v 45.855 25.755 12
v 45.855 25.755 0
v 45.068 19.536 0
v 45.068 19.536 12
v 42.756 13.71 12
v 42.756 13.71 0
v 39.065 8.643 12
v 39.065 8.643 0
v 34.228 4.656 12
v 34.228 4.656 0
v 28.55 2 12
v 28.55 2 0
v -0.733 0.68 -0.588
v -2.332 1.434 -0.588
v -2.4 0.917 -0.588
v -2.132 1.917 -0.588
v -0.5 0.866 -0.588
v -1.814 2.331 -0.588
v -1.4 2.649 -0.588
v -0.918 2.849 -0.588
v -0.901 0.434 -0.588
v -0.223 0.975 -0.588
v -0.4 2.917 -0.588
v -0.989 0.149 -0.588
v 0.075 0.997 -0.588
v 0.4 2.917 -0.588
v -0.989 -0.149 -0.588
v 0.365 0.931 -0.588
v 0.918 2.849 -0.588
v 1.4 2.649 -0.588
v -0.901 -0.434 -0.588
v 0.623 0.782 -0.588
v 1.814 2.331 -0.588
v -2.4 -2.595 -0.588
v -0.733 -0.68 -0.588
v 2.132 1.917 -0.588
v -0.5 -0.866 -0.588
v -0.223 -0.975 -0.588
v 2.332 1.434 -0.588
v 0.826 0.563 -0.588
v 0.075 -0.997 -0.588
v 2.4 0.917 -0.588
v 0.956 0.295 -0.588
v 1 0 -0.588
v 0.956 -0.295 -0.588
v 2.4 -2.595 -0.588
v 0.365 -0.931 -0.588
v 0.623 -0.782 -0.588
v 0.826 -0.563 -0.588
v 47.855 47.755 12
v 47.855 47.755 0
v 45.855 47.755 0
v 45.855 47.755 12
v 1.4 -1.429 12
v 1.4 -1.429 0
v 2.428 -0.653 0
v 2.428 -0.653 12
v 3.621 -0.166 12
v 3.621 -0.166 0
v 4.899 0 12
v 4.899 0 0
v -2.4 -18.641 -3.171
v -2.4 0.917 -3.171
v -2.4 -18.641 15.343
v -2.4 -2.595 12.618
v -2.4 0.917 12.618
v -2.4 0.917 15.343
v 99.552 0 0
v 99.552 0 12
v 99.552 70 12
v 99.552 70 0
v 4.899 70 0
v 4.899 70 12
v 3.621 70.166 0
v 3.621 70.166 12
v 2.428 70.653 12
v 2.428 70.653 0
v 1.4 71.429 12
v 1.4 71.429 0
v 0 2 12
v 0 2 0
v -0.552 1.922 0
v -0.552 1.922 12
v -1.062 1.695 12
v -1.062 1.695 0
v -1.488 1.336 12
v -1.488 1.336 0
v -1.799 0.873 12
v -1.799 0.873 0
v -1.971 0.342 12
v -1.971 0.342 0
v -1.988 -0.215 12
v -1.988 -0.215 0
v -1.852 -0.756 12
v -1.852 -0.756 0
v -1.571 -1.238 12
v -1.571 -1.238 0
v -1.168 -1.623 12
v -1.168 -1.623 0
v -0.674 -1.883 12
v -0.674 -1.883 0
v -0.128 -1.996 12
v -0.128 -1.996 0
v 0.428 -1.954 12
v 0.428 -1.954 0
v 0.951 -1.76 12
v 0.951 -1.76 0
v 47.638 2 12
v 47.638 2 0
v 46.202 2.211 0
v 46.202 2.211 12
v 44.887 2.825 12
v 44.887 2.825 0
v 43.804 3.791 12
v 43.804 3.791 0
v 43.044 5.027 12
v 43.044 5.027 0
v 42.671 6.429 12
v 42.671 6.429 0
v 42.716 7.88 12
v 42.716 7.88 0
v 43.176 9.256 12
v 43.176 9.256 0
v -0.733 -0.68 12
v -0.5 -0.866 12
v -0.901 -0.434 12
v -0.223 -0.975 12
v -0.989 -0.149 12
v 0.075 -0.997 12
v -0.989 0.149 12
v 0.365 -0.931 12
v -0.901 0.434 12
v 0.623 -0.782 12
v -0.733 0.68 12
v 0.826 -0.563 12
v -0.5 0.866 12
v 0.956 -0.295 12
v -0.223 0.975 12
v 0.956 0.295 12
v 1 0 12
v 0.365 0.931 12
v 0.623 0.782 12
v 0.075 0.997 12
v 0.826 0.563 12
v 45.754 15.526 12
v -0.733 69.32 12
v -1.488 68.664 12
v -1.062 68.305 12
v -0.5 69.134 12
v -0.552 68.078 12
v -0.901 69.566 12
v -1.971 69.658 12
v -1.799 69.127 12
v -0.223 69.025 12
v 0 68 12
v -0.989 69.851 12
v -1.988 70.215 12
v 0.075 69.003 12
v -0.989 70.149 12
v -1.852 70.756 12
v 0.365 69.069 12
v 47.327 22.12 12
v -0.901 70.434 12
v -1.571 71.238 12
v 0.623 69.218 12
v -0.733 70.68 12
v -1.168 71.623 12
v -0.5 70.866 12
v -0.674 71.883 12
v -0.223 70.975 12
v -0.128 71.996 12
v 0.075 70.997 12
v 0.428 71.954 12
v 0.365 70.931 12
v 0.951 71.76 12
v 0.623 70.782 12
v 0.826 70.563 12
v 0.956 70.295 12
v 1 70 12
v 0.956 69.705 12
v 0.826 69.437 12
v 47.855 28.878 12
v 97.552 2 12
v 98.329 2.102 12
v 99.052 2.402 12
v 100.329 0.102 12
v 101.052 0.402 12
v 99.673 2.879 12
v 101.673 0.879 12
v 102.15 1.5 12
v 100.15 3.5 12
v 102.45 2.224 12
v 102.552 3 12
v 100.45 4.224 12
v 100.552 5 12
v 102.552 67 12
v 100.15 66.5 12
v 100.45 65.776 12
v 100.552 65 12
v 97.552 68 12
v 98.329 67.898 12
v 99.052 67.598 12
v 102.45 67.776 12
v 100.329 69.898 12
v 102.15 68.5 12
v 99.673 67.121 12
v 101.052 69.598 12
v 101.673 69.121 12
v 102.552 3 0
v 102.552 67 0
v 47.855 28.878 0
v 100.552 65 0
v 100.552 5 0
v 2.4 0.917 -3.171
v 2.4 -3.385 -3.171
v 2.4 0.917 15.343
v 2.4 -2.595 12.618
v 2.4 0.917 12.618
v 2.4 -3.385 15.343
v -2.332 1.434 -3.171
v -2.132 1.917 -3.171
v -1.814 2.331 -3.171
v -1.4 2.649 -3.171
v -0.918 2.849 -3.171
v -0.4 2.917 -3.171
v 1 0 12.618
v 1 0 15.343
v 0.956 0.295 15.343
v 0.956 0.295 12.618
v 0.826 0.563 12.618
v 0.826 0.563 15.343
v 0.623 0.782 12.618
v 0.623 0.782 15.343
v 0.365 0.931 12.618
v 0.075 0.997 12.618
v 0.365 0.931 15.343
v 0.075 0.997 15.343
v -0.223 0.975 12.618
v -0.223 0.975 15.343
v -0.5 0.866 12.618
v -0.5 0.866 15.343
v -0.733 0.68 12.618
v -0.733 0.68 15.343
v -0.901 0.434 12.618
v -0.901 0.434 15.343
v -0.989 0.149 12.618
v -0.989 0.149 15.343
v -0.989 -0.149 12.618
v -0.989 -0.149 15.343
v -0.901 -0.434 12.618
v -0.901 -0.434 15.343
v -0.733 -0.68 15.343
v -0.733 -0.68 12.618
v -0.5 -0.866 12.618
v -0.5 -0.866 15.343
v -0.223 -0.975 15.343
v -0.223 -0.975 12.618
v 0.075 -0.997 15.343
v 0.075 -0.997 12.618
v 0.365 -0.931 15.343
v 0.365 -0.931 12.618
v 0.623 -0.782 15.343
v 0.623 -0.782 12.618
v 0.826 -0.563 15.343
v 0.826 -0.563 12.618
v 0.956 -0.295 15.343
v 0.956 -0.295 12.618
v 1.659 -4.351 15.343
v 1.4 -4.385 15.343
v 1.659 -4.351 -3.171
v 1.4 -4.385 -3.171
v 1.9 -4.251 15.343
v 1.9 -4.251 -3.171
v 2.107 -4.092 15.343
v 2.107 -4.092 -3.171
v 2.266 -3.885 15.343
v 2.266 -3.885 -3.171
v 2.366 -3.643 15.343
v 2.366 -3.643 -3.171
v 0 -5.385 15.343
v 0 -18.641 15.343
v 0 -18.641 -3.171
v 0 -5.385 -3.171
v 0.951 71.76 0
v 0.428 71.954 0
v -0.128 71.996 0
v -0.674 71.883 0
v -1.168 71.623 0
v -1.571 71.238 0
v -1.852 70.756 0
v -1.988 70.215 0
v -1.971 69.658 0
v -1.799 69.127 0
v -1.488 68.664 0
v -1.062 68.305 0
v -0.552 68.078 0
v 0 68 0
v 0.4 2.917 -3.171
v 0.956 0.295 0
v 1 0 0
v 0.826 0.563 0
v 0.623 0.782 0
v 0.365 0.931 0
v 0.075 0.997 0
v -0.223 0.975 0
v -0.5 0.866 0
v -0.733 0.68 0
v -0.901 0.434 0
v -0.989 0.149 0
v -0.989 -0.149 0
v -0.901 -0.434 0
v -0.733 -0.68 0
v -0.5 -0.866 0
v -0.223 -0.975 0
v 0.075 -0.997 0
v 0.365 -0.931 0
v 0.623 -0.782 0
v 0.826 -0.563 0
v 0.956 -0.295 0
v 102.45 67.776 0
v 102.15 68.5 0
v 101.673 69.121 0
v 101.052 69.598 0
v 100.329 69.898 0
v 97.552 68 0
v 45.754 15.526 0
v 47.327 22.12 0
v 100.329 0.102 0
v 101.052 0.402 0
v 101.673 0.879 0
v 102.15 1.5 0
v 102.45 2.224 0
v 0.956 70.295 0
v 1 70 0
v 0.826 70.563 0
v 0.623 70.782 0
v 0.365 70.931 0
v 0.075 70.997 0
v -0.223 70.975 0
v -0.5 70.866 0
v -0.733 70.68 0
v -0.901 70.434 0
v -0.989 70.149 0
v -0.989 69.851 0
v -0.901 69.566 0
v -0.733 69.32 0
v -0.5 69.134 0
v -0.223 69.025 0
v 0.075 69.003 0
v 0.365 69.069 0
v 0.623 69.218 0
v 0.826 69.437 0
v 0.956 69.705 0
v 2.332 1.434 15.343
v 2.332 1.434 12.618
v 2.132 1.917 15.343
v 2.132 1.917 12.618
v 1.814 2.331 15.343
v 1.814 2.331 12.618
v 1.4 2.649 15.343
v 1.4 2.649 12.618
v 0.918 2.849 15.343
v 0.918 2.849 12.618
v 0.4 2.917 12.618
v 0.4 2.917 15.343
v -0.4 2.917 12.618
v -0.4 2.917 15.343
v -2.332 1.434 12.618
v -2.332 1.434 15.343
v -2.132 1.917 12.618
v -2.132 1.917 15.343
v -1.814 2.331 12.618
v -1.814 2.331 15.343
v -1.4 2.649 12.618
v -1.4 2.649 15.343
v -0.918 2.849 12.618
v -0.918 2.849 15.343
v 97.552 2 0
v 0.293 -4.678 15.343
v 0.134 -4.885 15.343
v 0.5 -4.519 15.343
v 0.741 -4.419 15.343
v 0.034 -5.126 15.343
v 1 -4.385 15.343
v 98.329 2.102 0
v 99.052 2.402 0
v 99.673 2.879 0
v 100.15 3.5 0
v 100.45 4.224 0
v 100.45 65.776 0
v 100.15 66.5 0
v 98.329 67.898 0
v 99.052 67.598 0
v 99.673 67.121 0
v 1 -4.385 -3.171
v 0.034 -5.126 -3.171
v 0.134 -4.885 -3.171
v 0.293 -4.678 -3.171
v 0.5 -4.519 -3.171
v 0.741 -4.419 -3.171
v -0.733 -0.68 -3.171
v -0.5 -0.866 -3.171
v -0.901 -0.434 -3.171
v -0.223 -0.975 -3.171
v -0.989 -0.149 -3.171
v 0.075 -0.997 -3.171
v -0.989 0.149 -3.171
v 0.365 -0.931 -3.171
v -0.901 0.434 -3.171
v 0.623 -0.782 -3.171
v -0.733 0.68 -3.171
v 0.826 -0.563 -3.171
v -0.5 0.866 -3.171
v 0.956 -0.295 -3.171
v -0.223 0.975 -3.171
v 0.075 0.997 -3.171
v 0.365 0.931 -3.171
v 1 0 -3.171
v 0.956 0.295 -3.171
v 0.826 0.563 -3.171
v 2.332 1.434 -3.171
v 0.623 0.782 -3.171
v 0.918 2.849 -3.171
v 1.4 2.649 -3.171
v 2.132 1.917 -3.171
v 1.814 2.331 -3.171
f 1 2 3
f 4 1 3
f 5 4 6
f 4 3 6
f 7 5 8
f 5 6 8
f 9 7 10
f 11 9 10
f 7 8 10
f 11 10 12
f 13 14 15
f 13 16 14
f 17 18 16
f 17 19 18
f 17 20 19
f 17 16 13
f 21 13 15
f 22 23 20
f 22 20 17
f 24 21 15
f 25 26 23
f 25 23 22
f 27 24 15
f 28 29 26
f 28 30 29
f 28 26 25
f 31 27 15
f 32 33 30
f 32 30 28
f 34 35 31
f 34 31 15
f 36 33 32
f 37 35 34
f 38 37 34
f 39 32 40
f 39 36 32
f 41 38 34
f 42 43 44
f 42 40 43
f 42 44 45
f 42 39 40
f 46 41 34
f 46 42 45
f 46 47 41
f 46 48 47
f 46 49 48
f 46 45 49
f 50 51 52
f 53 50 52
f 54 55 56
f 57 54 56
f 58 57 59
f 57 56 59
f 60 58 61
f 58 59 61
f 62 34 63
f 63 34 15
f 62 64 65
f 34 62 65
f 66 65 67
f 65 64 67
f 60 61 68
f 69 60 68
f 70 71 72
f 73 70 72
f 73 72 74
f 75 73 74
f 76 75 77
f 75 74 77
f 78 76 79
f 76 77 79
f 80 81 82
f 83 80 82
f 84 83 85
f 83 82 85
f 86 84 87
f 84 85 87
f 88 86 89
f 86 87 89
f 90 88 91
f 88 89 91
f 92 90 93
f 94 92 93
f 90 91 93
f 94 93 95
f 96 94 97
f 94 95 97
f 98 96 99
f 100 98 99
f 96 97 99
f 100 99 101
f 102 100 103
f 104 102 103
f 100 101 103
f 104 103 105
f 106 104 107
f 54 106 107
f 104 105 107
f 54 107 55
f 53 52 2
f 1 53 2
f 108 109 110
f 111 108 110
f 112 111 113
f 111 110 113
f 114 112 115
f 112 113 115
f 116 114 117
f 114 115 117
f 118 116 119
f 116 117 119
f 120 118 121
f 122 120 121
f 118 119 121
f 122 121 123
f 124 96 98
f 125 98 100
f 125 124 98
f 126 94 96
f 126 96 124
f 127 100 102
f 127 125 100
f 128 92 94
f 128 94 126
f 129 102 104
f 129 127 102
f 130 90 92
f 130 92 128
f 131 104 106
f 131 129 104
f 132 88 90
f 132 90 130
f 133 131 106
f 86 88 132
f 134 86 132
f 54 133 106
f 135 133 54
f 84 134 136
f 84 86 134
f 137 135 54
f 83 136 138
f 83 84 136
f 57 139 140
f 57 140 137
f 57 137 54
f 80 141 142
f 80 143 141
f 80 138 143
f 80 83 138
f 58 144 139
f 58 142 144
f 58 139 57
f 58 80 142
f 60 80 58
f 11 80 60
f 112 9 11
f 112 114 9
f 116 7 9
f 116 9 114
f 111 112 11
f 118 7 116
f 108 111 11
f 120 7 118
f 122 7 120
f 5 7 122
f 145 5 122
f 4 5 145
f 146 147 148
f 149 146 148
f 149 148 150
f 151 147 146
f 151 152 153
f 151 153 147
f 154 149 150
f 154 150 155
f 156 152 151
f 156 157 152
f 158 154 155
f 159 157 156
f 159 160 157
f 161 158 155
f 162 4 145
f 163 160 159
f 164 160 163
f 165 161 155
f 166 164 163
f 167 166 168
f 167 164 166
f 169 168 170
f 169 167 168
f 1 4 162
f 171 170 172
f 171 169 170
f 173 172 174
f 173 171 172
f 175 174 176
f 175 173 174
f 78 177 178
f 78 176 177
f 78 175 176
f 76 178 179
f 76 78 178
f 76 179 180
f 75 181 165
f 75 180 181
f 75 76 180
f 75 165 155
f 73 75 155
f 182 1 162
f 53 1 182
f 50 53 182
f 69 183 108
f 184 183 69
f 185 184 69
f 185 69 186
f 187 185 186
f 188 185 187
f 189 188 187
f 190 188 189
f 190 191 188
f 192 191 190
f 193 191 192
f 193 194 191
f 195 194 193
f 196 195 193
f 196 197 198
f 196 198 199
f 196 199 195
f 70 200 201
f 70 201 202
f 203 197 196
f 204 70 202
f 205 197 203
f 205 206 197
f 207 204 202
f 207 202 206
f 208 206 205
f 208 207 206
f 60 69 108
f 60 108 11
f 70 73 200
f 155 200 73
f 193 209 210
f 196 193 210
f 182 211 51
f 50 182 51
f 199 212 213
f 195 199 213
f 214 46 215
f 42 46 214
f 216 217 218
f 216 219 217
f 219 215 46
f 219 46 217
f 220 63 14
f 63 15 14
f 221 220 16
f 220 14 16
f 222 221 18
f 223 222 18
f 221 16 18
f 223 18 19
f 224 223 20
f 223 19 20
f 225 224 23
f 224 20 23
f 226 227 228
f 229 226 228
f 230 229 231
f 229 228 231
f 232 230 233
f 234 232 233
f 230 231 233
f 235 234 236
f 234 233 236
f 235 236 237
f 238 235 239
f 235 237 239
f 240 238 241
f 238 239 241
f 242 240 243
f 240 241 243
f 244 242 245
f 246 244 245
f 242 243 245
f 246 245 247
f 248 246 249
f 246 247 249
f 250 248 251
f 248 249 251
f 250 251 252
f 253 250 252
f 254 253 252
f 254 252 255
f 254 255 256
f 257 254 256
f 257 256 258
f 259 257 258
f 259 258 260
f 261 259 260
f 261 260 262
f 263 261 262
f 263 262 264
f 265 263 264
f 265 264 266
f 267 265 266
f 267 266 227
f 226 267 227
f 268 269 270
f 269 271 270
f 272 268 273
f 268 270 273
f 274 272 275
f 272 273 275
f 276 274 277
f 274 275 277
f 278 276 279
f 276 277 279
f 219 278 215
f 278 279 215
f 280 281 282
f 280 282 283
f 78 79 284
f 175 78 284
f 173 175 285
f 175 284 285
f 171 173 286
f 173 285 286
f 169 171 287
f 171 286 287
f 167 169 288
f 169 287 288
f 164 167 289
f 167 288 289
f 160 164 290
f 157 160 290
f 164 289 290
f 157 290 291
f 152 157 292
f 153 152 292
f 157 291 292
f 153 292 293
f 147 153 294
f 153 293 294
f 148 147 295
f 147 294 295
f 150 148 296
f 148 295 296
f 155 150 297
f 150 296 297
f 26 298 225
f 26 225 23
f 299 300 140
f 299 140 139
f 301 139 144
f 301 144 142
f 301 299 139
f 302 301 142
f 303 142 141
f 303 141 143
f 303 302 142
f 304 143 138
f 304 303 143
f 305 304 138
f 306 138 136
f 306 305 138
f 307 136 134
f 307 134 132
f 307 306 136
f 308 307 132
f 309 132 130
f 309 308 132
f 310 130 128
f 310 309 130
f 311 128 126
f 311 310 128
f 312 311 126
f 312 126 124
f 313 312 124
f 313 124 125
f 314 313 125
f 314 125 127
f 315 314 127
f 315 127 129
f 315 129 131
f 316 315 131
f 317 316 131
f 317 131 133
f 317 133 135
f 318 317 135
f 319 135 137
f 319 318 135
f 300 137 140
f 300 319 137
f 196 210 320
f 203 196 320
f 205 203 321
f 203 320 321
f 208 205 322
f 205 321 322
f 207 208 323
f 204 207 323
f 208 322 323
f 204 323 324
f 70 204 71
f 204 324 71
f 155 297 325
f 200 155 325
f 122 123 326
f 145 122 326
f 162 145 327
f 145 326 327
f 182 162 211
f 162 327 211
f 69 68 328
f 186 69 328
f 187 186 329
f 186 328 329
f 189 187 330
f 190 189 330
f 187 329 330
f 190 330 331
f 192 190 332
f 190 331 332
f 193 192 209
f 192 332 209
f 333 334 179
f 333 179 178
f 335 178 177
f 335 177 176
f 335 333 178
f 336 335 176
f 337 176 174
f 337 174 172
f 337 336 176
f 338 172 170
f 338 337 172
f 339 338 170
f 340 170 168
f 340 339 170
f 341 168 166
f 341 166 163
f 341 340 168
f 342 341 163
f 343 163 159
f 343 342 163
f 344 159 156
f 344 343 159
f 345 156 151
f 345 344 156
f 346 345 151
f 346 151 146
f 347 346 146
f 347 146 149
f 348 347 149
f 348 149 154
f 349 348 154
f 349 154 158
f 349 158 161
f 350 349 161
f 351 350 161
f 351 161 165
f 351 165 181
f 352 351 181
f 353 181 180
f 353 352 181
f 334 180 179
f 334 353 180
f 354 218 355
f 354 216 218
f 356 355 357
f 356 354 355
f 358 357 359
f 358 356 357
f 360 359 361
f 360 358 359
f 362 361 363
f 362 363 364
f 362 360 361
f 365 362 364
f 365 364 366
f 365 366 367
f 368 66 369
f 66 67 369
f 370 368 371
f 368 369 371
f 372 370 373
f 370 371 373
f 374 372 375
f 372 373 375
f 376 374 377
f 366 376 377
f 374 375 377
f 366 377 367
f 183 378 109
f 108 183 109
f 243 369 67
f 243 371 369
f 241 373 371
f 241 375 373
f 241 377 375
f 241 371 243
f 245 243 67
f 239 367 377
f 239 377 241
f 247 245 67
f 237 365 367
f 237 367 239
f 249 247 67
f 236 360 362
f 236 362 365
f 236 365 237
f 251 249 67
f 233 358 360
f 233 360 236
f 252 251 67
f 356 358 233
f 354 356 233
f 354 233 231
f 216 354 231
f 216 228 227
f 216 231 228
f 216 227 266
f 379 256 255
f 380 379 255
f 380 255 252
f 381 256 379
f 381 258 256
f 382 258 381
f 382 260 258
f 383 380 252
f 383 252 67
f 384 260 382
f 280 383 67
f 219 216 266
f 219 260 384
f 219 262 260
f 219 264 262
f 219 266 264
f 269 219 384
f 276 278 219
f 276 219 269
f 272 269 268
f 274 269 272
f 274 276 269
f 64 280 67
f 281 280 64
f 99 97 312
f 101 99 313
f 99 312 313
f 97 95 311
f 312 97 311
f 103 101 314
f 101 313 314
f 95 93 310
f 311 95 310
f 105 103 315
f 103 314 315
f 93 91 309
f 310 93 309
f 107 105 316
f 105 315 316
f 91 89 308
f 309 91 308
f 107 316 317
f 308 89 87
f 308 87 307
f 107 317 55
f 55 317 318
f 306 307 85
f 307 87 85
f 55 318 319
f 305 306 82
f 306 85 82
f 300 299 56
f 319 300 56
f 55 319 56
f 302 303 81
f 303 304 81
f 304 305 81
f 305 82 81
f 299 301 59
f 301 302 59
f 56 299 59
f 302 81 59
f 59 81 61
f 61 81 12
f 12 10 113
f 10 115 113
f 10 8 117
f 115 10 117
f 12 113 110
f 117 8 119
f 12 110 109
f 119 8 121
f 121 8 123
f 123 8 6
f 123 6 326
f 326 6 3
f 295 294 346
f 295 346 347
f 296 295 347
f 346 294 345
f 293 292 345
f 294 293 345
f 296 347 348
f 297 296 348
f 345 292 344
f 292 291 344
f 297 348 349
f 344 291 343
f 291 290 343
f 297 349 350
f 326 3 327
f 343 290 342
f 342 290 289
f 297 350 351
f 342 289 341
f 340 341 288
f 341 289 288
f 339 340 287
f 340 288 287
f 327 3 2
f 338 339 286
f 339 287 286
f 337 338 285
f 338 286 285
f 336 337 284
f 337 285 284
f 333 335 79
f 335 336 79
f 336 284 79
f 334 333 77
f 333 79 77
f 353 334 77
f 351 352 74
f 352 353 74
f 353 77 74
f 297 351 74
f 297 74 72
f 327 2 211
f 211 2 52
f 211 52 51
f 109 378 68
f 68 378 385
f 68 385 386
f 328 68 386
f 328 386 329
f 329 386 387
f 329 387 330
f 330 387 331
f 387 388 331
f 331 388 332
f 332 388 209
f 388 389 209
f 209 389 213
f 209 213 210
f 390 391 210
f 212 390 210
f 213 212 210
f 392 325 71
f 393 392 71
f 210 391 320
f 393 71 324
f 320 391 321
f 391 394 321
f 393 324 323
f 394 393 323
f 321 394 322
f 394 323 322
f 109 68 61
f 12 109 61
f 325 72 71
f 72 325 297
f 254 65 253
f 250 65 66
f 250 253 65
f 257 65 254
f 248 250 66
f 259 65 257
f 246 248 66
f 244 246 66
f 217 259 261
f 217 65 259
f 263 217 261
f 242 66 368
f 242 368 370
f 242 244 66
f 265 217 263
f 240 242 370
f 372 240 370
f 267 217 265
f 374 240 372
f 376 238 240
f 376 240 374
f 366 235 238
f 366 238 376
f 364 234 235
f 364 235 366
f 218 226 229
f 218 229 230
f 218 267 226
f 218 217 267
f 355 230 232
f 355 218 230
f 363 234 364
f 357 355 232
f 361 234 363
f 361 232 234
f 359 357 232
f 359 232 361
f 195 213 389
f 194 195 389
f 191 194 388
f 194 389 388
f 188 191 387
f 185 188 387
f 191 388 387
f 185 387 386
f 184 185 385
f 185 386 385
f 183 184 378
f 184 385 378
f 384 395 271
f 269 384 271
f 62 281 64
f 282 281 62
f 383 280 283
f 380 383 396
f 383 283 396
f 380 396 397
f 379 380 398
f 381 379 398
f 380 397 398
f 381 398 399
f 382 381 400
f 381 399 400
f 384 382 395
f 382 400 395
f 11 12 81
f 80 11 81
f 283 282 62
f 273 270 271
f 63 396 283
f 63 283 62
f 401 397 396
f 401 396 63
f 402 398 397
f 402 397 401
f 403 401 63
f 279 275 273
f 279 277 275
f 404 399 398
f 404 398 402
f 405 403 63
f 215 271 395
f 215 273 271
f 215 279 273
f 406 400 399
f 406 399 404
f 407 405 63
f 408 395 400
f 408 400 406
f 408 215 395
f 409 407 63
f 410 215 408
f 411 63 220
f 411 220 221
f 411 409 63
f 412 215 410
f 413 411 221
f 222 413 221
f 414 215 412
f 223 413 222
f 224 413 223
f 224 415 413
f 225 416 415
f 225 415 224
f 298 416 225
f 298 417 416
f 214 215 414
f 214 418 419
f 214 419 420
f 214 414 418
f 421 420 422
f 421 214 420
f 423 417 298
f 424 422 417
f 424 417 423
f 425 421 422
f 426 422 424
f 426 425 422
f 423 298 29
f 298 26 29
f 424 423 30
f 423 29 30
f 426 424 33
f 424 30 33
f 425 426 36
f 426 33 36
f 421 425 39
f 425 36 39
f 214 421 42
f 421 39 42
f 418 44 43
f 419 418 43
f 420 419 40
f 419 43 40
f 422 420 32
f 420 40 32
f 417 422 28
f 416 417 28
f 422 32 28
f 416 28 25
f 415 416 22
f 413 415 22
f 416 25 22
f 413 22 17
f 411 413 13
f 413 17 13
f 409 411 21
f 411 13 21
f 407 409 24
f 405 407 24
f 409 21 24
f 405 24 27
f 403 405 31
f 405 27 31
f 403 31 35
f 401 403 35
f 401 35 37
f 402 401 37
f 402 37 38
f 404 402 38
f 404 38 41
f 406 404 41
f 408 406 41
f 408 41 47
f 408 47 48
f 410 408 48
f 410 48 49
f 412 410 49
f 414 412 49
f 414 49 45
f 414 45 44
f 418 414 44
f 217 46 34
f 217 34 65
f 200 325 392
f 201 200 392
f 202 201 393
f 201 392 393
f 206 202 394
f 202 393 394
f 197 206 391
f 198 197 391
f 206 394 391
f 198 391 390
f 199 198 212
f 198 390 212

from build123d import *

# Parameters (mm, degrees)
F0_R     = 1
F1_DEPTH = 12
F3_DEPTH = 2.4
F4_R     = 1
F5_DEPTH = 25
F6_R     = 2
F7_W     = 2.983586
F7_H     = 14.870913
F8_DEPTH = 25
F9_R     = 1


with BuildPart() as f1:
    # F0 (on Top) → F1 (new body)
    with BuildSketch(Plane.XY):
        with BuildLine():
            Line((28.549692, 2), (0, 2))
            ThreePointArc((0, 2), (-1.85164, -0.755929), (1.399708, -1.428571))
            ThreePointArc((1.399708, -1.428571), (3.009157, -0.3709), (4.898979, 0))
            Line((4.898979, 0), (99.552051, 0))
            ThreePointArc((99.552051, 0), (101.673372, 0.87868), (102.552051, 3))
            Line((102.552051, 3), (102.552051, 67))
            ThreePointArc((102.552051, 67), (101.673372, 69.12132), (99.552051, 70))
            Line((99.552051, 70), (4.898979, 70))
            ThreePointArc((4.898979, 70), (3.009157, 70.3709), (1.399708, 71.428571))
            ThreePointArc((1.399708, 71.428571), (-1.85164, 70.755929), (0, 68))
            Line((0, 68), (97.552051, 68))
            ThreePointArc((97.552051, 68), (99.673372, 67.12132), (100.552051, 65))
            Line((100.552051, 65), (100.552051, 5))
            ThreePointArc((100.552051, 5), (99.673372, 2.87868), (97.552051, 2))
            Line((97.552051, 2), (47.638197, 2))
            ThreePointArc((47.638197, 2), (43.379035, 4.380928), (43.176176, 9.256185))
            ThreePointArc((43.176176, 9.256185), (46.669044, 18.791967), (47.854893, 28.877849))
            Line((47.854893, 28.877849), (47.854893, 47.755239))
            Line((47.854893, 47.755239), (45.854893, 47.755239))
            Line((45.854893, 47.755239), (45.854893, 25.755239))
            ThreePointArc((45.854893, 25.755239), (41.069882, 11.06016), (28.549692, 2))
        make_face()
        Circle(F0_R, mode=Mode.SUBTRACT)
        with Locations((0, 70)):
            Circle(F0_R, mode=Mode.SUBTRACT)
    extrude(amount=F1_DEPTH)


with BuildPart() as f3:
    # F2 (on Right) → F3 (new body, symmetric)
    with BuildSketch(Plane.YZ):
        Polygon((-18.641306, -3.171306), (2.916667, -3.171306), (2.916667, -0.588372), (-2.595123, -0.588372), (-2.595123, 12.618463), (2.916667, 12.618463), (2.916667, 15.343188), (-18.641306, 15.343188), align=None)
    extrude(amount=F3_DEPTH, both=True)

    # F4 (on face) → F5 (cut)
    with BuildSketch(Plane.XY.offset(15.343188)):
        Circle(F4_R)
    extrude(amount=-F5_DEPTH, mode=Mode.SUBTRACT)

    # F6
    f6_edges = [f3.edges().sort_by_distance(p)[0] for p in [
        (-2.4, 2.916667, -1.879839),
        (2.4, 2.916667, -1.879839),
        (-2.4, 2.916667, 13.980825),
        (2.4, 2.916667, 13.980825),
    ]]
    fillet(f6_edges, radius=F6_R)

    # F7 (on face) → F8 (cut)
    with BuildSketch(Plane.XY.offset(15.343188)):
        with Locations((1.491793, -11.820071)):
            Rectangle(F7_W, F7_H)
    extrude(amount=-F8_DEPTH, mode=Mode.SUBTRACT)

    # F9
    f9_edges = [f3.edges().sort_by_distance(p)[0] for p in [
        (2.4, -4.384615, 6.085941),
        (0, -4.384615, 6.085941),
    ]]
    fillet(f9_edges, radius=F9_R)


solid = Compound([f1.part, f3.part])
